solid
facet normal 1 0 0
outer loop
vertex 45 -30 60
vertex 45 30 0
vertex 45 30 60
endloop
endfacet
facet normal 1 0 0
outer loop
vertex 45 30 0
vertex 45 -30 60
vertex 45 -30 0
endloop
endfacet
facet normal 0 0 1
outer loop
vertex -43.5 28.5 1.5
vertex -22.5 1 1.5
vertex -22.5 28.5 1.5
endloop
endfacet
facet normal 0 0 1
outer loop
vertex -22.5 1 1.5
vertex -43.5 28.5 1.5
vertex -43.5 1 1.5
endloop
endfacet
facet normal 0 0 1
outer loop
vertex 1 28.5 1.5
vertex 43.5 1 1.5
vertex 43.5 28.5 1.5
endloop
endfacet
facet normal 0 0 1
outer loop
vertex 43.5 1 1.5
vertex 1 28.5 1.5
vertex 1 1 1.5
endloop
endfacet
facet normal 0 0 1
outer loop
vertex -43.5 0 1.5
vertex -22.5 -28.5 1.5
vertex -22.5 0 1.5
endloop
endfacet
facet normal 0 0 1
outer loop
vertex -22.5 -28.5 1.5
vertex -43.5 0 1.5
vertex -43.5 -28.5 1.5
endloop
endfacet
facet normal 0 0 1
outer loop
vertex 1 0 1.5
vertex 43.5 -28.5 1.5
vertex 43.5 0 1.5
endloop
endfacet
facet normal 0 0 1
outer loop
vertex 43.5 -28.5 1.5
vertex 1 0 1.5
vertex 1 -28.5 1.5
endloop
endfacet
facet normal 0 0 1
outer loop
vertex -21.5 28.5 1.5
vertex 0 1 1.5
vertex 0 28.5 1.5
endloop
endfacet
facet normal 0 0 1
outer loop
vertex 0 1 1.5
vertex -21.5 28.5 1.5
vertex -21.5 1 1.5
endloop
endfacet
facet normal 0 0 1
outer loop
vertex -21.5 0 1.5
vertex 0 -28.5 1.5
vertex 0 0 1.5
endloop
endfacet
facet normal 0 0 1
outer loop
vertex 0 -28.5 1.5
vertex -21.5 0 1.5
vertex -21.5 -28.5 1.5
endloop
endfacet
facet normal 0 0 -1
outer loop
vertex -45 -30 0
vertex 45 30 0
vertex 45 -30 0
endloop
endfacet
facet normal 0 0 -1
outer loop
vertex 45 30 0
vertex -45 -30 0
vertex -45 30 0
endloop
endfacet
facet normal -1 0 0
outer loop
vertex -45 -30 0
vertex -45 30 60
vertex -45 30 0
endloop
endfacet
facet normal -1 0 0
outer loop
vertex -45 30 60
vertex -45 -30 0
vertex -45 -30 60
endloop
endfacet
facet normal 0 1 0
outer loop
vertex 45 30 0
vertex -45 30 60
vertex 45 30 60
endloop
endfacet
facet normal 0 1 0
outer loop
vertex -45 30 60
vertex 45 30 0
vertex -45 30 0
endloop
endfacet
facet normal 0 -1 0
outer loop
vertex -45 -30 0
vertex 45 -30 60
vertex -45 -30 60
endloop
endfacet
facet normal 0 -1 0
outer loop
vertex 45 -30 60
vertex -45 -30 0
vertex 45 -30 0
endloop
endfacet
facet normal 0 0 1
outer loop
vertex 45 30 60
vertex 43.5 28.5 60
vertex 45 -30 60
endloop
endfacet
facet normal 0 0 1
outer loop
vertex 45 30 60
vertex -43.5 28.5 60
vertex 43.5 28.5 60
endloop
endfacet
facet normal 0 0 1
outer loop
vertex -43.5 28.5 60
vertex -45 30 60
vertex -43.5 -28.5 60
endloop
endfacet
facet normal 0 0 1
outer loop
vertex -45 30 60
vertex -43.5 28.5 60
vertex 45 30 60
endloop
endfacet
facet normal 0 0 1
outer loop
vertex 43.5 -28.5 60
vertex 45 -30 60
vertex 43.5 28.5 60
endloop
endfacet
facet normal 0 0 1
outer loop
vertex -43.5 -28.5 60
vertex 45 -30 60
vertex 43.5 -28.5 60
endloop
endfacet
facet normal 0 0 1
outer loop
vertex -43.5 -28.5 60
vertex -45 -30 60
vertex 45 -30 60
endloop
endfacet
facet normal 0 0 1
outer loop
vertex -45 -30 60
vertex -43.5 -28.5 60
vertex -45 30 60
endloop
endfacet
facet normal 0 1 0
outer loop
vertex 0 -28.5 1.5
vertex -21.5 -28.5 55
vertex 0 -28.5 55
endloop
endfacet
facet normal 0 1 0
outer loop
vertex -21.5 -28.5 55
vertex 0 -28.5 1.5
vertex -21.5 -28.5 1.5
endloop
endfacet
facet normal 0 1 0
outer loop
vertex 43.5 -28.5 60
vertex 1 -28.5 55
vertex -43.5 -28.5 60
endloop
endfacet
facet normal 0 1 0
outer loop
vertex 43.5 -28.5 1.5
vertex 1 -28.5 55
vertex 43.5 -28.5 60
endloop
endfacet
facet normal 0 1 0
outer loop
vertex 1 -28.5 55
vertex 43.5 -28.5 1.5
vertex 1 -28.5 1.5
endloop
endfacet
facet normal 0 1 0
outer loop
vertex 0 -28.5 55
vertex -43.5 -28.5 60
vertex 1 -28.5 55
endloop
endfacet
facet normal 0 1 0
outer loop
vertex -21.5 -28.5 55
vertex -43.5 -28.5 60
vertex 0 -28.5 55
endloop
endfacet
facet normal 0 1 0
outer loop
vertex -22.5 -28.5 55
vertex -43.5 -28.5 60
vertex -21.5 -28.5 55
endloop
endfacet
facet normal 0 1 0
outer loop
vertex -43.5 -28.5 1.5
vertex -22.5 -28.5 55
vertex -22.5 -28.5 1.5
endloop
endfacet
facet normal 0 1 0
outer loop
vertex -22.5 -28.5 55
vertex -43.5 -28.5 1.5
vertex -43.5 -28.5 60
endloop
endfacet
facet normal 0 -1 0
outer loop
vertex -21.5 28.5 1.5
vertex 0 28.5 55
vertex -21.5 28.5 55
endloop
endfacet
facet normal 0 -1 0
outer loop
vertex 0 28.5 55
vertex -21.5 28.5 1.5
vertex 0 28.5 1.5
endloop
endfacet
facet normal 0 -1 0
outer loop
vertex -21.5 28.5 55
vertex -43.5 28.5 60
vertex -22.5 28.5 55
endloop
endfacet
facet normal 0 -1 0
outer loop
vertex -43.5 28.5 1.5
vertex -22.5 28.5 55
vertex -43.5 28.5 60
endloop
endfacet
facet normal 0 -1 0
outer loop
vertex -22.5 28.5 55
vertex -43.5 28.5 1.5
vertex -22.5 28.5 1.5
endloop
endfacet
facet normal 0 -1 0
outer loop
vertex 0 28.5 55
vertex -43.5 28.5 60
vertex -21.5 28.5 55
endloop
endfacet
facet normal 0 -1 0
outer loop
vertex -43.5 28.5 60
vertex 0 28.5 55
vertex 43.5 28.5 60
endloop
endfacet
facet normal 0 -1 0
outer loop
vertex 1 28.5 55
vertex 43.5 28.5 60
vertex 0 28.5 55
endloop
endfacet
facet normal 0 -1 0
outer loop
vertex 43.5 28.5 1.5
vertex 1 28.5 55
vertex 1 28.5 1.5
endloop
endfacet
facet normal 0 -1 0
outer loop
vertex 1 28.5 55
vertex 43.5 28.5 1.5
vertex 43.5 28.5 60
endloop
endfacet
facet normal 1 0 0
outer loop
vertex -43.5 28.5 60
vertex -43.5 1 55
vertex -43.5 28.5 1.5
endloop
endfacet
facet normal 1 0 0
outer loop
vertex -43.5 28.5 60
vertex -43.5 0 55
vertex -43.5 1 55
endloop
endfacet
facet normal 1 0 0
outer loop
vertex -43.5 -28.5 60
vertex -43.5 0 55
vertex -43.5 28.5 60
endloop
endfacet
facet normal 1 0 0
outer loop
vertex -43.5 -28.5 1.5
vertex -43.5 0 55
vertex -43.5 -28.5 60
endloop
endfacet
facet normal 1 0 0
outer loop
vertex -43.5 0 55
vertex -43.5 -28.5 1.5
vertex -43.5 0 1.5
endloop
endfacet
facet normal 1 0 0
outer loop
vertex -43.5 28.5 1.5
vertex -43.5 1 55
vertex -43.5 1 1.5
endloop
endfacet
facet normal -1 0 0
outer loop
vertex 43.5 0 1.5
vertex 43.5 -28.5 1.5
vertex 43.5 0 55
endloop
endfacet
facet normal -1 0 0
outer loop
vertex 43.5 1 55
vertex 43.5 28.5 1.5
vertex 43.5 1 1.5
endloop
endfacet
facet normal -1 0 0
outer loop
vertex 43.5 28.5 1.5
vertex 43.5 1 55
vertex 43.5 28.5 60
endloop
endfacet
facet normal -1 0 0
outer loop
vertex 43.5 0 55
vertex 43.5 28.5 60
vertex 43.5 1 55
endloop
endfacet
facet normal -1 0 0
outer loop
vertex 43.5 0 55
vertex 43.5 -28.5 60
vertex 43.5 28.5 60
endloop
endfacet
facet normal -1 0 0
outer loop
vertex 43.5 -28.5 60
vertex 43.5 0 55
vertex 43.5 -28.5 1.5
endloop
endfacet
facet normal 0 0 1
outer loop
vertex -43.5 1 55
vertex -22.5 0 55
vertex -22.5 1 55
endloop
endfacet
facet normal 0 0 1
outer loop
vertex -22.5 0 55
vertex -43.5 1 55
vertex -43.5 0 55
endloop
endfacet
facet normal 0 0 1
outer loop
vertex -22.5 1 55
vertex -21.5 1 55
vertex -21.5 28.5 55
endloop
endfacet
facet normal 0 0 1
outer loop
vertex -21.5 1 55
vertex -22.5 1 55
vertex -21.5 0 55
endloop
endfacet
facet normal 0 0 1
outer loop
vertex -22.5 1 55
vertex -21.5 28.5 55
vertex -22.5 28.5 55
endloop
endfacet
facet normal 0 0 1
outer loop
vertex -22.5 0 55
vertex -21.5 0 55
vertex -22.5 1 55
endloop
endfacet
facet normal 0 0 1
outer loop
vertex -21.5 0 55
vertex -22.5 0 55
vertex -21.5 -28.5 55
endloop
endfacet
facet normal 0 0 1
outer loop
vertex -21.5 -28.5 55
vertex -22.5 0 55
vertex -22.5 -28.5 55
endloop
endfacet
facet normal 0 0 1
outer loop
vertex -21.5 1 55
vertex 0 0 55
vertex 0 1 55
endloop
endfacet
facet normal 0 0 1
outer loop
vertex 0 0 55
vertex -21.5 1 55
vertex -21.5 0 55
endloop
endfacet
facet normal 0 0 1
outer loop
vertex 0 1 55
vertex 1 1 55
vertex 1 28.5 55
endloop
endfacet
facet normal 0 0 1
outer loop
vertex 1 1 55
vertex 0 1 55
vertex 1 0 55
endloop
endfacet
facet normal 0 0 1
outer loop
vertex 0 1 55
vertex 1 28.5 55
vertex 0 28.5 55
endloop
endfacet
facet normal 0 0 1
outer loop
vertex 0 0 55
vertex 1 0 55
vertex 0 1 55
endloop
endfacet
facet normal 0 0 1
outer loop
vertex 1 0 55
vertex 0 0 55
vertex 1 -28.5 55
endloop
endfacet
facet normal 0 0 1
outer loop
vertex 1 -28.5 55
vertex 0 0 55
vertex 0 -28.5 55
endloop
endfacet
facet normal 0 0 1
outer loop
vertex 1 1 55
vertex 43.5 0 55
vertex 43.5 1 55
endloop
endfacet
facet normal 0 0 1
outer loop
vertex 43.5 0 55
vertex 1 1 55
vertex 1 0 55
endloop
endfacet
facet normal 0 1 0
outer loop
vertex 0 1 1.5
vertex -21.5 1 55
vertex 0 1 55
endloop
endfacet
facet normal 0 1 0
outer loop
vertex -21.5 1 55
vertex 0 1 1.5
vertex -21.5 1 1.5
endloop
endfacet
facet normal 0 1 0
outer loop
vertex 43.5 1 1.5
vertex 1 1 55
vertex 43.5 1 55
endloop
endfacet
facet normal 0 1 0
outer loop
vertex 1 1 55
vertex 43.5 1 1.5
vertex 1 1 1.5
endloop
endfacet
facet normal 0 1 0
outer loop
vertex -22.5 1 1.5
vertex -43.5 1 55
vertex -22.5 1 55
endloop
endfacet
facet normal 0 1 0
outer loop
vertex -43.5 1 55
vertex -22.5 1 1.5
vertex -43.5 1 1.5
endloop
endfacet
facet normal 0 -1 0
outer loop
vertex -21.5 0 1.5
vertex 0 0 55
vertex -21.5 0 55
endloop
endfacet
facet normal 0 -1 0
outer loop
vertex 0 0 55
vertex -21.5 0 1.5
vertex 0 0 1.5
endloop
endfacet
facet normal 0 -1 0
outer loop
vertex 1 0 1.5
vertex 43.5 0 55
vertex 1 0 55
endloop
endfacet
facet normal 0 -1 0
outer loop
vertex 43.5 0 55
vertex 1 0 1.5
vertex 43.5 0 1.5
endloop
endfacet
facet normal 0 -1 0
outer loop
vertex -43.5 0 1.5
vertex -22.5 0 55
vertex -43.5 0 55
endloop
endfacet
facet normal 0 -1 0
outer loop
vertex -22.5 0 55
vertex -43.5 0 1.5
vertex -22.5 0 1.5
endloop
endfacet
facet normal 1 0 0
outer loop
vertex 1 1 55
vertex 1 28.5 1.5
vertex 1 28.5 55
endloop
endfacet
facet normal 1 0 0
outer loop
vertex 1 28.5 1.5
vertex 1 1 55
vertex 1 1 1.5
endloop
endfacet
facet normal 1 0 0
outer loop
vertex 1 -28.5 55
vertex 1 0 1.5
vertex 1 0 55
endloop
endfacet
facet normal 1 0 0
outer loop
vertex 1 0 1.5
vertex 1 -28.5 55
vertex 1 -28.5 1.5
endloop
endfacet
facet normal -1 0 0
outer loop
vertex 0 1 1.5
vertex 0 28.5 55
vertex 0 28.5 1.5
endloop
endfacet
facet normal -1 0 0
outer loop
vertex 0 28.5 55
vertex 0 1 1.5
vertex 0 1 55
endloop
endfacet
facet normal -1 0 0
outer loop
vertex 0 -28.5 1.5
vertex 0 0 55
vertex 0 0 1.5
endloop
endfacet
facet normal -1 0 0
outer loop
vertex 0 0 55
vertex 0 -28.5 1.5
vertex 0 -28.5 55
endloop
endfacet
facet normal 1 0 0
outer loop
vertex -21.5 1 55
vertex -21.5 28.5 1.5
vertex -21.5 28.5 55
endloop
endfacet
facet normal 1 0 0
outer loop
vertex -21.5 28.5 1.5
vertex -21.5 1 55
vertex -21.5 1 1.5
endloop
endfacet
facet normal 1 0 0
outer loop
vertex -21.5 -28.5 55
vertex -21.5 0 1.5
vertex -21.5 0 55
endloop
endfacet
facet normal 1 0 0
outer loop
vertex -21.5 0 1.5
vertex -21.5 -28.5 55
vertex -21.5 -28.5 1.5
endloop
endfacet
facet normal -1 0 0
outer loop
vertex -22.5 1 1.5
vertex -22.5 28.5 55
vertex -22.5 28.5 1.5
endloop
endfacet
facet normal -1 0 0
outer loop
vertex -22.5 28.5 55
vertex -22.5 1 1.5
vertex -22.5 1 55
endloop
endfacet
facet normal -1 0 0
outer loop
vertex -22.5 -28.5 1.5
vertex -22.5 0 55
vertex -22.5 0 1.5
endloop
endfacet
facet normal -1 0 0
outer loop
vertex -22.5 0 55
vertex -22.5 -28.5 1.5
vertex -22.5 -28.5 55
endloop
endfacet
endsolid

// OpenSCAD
/*
Simple Tool Box (c) by Jorge Monteiro

Simple Tool Box is licensed under a
Creative Commons Attribution-ShareAlike 4.0 International.

You should have received a copy of the license along with this
work.  If not, see <http://creativecommons.org/licenses/by-sa/4.0/>.
*/
wallThickness = 1.5;
boxWidth = 90;
boxLength = 60;
boxHeight = 60;
separatorTopGap = 5;
separatorThickness = 1;

drawBox();
drawSeparators();

module drawSeparators() {
    separatorVertGrid = boxWidth/4;
    // Draw the walls
    translate([-boxWidth/2, 0, 0]) cube([boxWidth, separatorThickness, boxHeight-separatorTopGap]);
    translate([0, -boxLength/2, 0]) cube([separatorThickness, boxLength, boxHeight-separatorTopGap]);
    translate([-separatorVertGrid, -boxLength/2, 0]) cube([separatorThickness, boxLength, boxHeight-separatorTopGap]);
};

module drawBox() {
    // Draw the base
    translate([-boxWidth/2, -boxLength/2, 0]) cube([boxWidth,boxLength,wallThickness]);
    // Draw the walls
    translate([-boxWidth/2, -boxLength/2, 0]) cube([boxWidth, wallThickness, boxHeight]);
    translate([-boxWidth/2, boxLength/2-wallThickness, 0]) cube([boxWidth, wallThickness, boxHeight]);
    translate([-boxWidth/2, -boxLength/2, 0]) cube([wallThickness, boxLength, boxHeight]);
    translate([boxWidth/2-wallThickness, -boxLength/2, 0]) cube([wallThickness, boxLength, boxHeight]);
};
